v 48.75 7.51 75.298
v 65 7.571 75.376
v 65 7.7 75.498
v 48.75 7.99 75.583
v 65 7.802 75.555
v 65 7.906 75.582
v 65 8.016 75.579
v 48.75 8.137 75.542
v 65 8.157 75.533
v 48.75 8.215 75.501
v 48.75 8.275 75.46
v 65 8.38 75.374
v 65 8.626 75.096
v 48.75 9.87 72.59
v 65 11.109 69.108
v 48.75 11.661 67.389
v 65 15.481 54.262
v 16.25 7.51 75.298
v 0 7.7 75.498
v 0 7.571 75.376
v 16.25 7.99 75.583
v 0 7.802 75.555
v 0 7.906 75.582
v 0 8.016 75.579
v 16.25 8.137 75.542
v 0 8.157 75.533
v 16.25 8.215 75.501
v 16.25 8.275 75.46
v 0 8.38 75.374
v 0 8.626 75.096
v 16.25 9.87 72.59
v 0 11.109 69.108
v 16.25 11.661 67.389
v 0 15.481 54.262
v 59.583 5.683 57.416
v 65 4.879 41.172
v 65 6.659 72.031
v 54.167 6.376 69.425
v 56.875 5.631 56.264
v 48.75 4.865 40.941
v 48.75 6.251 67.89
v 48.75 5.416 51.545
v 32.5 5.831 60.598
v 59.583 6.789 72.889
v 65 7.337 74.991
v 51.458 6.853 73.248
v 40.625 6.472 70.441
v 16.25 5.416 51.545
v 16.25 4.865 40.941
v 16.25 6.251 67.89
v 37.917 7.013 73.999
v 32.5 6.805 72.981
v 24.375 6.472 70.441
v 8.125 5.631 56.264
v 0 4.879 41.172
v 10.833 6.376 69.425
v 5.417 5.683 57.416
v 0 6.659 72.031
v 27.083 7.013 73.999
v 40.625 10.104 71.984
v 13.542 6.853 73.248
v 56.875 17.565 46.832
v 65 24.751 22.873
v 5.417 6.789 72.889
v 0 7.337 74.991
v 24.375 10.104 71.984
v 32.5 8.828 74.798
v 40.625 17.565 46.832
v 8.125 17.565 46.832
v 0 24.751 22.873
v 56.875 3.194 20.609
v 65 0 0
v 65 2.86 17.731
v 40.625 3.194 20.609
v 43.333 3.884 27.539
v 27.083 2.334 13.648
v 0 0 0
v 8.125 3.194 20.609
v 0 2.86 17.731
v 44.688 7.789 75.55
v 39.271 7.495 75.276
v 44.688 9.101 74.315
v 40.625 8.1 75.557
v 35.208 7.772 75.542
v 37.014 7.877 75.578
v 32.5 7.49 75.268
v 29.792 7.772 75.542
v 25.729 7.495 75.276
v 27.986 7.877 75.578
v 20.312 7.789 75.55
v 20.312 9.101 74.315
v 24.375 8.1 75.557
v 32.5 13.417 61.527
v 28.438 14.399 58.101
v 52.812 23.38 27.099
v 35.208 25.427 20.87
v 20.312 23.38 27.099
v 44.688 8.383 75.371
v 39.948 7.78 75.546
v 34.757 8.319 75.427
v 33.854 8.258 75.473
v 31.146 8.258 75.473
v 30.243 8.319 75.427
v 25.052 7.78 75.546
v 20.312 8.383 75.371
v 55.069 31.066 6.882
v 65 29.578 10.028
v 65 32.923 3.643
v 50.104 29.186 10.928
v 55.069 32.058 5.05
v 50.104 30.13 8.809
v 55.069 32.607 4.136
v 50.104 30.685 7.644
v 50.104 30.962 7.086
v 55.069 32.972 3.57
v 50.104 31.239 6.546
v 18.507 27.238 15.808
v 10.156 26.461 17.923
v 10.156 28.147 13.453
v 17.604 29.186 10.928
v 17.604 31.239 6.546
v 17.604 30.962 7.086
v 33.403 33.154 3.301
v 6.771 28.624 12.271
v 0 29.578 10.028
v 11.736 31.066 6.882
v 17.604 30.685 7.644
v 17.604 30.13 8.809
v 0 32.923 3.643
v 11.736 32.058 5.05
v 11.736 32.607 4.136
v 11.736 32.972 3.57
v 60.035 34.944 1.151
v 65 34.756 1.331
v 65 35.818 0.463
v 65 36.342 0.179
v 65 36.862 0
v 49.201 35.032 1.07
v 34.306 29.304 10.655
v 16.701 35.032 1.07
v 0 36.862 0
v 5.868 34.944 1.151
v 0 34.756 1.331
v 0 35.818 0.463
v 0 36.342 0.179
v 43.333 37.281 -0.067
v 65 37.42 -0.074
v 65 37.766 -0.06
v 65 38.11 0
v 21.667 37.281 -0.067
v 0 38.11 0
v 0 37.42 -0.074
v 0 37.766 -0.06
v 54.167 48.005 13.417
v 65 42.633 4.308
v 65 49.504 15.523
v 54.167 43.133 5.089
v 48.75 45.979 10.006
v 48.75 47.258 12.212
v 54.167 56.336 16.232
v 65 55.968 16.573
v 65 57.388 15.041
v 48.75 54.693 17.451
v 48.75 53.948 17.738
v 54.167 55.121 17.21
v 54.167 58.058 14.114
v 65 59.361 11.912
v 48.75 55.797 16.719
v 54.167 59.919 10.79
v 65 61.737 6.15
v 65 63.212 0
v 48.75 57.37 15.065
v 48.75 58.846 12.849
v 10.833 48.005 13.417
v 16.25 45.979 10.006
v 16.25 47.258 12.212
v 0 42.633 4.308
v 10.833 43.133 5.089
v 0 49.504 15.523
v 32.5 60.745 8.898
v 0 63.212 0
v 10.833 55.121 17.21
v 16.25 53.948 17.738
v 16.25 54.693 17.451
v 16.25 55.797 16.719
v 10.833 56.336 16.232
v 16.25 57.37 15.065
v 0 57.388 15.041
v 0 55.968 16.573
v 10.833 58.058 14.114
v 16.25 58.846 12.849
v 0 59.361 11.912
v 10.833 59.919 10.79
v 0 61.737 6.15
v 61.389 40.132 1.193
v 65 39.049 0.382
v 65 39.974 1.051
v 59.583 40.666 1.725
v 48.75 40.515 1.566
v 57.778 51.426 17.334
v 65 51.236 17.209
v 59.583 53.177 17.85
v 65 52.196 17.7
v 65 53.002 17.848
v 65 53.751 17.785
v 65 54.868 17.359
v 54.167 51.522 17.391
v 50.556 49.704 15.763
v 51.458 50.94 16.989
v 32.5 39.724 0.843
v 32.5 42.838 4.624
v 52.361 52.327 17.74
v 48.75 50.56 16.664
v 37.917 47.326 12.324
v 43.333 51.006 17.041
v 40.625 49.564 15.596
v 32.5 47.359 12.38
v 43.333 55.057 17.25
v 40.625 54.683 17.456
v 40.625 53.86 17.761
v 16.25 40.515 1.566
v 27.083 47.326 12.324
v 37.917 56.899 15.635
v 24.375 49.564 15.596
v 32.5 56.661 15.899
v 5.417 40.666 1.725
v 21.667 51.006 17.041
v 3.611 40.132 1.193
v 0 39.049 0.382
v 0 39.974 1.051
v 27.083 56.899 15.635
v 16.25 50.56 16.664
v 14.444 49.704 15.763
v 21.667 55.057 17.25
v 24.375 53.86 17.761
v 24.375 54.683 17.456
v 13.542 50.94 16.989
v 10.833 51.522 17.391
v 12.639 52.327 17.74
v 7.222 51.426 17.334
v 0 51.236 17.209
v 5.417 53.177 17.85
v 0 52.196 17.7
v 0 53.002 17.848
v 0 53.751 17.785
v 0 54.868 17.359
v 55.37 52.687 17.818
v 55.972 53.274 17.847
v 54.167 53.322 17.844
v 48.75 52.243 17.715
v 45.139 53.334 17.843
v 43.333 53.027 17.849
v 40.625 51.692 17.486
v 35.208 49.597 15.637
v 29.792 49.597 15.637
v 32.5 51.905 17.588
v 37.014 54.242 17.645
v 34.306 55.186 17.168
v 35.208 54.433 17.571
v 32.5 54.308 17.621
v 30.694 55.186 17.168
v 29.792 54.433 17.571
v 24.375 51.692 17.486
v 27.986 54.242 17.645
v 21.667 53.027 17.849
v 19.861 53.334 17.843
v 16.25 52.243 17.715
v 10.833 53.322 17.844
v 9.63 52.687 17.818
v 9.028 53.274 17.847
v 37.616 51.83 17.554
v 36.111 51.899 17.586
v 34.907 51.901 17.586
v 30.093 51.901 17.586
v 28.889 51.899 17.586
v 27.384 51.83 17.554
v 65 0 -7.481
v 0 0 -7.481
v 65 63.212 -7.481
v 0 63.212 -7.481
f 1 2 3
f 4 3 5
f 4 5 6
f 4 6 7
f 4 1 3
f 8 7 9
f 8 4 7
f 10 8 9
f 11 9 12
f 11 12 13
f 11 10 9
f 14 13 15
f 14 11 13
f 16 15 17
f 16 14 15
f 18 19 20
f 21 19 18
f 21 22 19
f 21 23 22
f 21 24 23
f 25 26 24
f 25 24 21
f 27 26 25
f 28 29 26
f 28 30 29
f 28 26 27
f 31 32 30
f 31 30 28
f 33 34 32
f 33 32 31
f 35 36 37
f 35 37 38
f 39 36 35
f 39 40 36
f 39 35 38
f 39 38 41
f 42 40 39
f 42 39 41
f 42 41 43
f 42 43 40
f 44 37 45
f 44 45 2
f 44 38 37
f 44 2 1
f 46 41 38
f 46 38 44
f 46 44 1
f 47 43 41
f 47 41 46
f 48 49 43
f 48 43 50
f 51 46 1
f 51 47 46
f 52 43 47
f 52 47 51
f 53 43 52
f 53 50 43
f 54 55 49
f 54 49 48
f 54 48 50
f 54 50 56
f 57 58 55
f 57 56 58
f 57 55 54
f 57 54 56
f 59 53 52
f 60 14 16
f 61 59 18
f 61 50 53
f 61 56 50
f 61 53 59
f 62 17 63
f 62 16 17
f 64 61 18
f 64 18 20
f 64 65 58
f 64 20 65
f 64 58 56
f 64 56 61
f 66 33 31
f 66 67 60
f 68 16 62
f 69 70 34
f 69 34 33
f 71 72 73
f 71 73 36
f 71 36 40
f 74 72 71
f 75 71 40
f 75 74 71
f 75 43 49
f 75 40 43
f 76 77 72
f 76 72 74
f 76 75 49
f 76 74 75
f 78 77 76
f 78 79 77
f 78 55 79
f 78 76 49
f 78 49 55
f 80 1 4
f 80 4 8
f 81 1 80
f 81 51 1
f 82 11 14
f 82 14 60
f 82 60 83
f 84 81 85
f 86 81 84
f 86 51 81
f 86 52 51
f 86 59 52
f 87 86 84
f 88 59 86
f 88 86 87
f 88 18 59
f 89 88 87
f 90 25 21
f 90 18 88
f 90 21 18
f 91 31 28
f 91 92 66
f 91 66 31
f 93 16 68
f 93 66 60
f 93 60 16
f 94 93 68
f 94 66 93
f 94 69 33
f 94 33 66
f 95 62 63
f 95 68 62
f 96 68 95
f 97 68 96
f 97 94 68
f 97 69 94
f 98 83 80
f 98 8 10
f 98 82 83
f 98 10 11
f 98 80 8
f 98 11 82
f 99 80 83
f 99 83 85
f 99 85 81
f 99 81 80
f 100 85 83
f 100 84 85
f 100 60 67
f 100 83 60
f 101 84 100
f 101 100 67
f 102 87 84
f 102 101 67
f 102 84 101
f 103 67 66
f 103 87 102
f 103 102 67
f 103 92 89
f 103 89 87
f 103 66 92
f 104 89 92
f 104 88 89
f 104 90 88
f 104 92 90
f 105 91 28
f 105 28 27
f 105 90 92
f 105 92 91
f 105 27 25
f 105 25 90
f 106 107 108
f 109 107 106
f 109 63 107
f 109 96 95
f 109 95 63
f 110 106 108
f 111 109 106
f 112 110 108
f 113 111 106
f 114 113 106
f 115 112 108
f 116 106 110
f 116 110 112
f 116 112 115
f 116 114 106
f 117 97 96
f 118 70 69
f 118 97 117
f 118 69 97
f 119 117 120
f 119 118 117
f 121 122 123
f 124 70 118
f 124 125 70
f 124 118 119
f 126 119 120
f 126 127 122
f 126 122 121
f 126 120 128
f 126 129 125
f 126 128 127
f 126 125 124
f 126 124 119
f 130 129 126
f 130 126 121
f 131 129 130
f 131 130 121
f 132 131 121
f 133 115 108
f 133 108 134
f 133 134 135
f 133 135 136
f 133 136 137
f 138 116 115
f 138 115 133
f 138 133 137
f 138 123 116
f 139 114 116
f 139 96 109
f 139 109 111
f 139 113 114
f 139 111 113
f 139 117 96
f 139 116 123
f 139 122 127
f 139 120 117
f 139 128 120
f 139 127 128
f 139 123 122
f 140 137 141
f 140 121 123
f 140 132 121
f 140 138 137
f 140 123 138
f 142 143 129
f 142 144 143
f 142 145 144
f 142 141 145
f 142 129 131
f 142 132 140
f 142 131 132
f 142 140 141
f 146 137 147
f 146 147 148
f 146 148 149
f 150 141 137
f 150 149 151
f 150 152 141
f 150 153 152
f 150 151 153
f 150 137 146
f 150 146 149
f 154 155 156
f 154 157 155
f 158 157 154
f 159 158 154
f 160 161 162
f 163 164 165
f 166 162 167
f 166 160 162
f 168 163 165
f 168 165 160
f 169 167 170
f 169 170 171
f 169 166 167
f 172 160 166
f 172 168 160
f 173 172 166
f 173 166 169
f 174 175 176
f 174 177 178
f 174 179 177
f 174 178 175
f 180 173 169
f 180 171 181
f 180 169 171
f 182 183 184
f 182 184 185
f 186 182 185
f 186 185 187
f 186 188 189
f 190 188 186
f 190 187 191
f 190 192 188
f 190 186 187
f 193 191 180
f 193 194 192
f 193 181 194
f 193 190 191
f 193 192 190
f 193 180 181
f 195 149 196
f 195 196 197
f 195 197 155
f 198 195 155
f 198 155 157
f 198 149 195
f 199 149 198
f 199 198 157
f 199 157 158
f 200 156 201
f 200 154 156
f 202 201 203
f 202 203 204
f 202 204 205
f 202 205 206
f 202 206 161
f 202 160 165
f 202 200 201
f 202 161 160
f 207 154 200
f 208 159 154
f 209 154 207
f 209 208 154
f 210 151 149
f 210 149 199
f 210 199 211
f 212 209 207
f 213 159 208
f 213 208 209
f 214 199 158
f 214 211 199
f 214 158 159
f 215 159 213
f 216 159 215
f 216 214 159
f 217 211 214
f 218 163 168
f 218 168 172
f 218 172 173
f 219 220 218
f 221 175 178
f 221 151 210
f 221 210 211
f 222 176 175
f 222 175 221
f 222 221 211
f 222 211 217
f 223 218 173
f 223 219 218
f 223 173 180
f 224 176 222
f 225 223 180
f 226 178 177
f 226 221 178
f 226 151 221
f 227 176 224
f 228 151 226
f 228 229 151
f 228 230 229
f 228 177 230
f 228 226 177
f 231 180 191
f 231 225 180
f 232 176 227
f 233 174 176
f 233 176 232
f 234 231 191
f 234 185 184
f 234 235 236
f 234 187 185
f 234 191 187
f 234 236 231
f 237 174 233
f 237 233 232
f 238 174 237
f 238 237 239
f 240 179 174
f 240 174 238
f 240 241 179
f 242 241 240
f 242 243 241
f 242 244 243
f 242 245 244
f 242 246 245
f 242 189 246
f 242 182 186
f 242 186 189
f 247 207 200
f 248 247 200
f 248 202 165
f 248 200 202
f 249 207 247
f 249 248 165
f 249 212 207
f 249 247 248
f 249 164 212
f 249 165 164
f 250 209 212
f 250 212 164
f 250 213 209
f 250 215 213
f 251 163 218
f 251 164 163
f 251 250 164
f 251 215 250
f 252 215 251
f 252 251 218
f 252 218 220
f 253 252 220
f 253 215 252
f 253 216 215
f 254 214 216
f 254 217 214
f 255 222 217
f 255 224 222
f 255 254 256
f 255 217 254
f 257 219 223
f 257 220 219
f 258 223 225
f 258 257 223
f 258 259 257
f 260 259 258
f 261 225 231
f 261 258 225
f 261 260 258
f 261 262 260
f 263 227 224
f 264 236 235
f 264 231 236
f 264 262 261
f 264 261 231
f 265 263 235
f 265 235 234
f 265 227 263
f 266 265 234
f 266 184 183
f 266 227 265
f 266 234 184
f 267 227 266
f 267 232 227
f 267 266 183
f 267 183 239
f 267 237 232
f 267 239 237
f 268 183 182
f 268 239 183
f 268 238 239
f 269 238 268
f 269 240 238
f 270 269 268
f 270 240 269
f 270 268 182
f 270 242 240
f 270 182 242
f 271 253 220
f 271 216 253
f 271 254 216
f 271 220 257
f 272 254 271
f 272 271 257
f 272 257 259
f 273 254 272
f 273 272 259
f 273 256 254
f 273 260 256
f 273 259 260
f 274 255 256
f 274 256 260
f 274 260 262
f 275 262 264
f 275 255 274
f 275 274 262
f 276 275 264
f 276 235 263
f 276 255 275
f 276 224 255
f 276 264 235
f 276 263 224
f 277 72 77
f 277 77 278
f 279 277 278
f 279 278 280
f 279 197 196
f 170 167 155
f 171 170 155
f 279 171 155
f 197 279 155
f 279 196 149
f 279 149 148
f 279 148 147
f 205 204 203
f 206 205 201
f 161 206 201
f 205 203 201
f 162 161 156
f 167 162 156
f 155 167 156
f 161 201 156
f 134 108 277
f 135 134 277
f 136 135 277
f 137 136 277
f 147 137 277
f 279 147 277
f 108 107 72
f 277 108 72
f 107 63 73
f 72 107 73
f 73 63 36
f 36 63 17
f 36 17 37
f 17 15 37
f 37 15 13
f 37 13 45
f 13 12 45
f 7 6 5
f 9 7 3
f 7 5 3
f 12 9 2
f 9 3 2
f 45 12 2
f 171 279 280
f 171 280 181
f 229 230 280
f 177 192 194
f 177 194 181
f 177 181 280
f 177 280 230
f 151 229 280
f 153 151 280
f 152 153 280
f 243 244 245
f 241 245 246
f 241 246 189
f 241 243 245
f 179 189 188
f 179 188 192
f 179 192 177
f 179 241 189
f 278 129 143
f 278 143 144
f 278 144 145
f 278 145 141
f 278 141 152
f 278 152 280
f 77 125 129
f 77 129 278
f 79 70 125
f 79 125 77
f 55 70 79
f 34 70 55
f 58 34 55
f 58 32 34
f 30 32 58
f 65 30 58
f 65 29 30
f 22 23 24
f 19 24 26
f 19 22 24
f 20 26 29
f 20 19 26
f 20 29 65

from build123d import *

# Parameters (mm, degrees)
F1_DEPTH = 65


with BuildPart() as f1:
    # F0 (on Right) → F1 (new body)
    with BuildSketch(Plane.YZ):
        with BuildLine():
            add(Edge.make_bspline(
                [(0, 0), (7.535805658, 35.7916641323), (0.7980118824, 130.0002884959), (26.7379139246, 2.4687719644), (36.8616245687, 0)],
                knots=[0, 0, 0, 0, 0.3214329284, 0.6524566012, 0.6524566012, 0.6524566012, 0.6524566012], degree=3))
            Line((0, 0), (36.8616245687, 0))
        make_face()
        with BuildLine():
            Line((36.8616245687, 0), (0, 0))
            Line((0, 0), (0, -7.4806414777))
            Line((0, -7.4806414777), (63.2124841213, -7.4806414777))
            Line((63.2124841213, -7.4806414777), (63.2124841213, 0))
            Line((63.2124841213, 0), (38.1099706596, 0))
            add(Edge.make_bspline(
                [(36.8616245687, 0), (37.2827904695, -0.1027056783), (37.6987003599, -0.097701161), (38.1099706596, 0)],
                knots=[0.6524566012, 0.6524566012, 0.6524566012, 0.6524566012, 0.6662278249, 0.6662278249, 0.6662278249, 0.6662278249], degree=3))
        make_face()
        with BuildLine():
            add(Edge.make_bspline(
                [(38.1099706596, 0), (43.0200186963, 1.1664284879), (51.645443653, 30.3569507717), (61.8684866833, 8.7077435887), (63.2124841213, 0)],
                knots=[0.6662278249, 0.6662278249, 0.6662278249, 0.6662278249, 0.8306388452, 1, 1, 1, 1], degree=3))
            Line((38.1099706596, 0), (63.2124841213, 0))
        make_face()
    extrude(amount=F1_DEPTH)


solid = f1.part
